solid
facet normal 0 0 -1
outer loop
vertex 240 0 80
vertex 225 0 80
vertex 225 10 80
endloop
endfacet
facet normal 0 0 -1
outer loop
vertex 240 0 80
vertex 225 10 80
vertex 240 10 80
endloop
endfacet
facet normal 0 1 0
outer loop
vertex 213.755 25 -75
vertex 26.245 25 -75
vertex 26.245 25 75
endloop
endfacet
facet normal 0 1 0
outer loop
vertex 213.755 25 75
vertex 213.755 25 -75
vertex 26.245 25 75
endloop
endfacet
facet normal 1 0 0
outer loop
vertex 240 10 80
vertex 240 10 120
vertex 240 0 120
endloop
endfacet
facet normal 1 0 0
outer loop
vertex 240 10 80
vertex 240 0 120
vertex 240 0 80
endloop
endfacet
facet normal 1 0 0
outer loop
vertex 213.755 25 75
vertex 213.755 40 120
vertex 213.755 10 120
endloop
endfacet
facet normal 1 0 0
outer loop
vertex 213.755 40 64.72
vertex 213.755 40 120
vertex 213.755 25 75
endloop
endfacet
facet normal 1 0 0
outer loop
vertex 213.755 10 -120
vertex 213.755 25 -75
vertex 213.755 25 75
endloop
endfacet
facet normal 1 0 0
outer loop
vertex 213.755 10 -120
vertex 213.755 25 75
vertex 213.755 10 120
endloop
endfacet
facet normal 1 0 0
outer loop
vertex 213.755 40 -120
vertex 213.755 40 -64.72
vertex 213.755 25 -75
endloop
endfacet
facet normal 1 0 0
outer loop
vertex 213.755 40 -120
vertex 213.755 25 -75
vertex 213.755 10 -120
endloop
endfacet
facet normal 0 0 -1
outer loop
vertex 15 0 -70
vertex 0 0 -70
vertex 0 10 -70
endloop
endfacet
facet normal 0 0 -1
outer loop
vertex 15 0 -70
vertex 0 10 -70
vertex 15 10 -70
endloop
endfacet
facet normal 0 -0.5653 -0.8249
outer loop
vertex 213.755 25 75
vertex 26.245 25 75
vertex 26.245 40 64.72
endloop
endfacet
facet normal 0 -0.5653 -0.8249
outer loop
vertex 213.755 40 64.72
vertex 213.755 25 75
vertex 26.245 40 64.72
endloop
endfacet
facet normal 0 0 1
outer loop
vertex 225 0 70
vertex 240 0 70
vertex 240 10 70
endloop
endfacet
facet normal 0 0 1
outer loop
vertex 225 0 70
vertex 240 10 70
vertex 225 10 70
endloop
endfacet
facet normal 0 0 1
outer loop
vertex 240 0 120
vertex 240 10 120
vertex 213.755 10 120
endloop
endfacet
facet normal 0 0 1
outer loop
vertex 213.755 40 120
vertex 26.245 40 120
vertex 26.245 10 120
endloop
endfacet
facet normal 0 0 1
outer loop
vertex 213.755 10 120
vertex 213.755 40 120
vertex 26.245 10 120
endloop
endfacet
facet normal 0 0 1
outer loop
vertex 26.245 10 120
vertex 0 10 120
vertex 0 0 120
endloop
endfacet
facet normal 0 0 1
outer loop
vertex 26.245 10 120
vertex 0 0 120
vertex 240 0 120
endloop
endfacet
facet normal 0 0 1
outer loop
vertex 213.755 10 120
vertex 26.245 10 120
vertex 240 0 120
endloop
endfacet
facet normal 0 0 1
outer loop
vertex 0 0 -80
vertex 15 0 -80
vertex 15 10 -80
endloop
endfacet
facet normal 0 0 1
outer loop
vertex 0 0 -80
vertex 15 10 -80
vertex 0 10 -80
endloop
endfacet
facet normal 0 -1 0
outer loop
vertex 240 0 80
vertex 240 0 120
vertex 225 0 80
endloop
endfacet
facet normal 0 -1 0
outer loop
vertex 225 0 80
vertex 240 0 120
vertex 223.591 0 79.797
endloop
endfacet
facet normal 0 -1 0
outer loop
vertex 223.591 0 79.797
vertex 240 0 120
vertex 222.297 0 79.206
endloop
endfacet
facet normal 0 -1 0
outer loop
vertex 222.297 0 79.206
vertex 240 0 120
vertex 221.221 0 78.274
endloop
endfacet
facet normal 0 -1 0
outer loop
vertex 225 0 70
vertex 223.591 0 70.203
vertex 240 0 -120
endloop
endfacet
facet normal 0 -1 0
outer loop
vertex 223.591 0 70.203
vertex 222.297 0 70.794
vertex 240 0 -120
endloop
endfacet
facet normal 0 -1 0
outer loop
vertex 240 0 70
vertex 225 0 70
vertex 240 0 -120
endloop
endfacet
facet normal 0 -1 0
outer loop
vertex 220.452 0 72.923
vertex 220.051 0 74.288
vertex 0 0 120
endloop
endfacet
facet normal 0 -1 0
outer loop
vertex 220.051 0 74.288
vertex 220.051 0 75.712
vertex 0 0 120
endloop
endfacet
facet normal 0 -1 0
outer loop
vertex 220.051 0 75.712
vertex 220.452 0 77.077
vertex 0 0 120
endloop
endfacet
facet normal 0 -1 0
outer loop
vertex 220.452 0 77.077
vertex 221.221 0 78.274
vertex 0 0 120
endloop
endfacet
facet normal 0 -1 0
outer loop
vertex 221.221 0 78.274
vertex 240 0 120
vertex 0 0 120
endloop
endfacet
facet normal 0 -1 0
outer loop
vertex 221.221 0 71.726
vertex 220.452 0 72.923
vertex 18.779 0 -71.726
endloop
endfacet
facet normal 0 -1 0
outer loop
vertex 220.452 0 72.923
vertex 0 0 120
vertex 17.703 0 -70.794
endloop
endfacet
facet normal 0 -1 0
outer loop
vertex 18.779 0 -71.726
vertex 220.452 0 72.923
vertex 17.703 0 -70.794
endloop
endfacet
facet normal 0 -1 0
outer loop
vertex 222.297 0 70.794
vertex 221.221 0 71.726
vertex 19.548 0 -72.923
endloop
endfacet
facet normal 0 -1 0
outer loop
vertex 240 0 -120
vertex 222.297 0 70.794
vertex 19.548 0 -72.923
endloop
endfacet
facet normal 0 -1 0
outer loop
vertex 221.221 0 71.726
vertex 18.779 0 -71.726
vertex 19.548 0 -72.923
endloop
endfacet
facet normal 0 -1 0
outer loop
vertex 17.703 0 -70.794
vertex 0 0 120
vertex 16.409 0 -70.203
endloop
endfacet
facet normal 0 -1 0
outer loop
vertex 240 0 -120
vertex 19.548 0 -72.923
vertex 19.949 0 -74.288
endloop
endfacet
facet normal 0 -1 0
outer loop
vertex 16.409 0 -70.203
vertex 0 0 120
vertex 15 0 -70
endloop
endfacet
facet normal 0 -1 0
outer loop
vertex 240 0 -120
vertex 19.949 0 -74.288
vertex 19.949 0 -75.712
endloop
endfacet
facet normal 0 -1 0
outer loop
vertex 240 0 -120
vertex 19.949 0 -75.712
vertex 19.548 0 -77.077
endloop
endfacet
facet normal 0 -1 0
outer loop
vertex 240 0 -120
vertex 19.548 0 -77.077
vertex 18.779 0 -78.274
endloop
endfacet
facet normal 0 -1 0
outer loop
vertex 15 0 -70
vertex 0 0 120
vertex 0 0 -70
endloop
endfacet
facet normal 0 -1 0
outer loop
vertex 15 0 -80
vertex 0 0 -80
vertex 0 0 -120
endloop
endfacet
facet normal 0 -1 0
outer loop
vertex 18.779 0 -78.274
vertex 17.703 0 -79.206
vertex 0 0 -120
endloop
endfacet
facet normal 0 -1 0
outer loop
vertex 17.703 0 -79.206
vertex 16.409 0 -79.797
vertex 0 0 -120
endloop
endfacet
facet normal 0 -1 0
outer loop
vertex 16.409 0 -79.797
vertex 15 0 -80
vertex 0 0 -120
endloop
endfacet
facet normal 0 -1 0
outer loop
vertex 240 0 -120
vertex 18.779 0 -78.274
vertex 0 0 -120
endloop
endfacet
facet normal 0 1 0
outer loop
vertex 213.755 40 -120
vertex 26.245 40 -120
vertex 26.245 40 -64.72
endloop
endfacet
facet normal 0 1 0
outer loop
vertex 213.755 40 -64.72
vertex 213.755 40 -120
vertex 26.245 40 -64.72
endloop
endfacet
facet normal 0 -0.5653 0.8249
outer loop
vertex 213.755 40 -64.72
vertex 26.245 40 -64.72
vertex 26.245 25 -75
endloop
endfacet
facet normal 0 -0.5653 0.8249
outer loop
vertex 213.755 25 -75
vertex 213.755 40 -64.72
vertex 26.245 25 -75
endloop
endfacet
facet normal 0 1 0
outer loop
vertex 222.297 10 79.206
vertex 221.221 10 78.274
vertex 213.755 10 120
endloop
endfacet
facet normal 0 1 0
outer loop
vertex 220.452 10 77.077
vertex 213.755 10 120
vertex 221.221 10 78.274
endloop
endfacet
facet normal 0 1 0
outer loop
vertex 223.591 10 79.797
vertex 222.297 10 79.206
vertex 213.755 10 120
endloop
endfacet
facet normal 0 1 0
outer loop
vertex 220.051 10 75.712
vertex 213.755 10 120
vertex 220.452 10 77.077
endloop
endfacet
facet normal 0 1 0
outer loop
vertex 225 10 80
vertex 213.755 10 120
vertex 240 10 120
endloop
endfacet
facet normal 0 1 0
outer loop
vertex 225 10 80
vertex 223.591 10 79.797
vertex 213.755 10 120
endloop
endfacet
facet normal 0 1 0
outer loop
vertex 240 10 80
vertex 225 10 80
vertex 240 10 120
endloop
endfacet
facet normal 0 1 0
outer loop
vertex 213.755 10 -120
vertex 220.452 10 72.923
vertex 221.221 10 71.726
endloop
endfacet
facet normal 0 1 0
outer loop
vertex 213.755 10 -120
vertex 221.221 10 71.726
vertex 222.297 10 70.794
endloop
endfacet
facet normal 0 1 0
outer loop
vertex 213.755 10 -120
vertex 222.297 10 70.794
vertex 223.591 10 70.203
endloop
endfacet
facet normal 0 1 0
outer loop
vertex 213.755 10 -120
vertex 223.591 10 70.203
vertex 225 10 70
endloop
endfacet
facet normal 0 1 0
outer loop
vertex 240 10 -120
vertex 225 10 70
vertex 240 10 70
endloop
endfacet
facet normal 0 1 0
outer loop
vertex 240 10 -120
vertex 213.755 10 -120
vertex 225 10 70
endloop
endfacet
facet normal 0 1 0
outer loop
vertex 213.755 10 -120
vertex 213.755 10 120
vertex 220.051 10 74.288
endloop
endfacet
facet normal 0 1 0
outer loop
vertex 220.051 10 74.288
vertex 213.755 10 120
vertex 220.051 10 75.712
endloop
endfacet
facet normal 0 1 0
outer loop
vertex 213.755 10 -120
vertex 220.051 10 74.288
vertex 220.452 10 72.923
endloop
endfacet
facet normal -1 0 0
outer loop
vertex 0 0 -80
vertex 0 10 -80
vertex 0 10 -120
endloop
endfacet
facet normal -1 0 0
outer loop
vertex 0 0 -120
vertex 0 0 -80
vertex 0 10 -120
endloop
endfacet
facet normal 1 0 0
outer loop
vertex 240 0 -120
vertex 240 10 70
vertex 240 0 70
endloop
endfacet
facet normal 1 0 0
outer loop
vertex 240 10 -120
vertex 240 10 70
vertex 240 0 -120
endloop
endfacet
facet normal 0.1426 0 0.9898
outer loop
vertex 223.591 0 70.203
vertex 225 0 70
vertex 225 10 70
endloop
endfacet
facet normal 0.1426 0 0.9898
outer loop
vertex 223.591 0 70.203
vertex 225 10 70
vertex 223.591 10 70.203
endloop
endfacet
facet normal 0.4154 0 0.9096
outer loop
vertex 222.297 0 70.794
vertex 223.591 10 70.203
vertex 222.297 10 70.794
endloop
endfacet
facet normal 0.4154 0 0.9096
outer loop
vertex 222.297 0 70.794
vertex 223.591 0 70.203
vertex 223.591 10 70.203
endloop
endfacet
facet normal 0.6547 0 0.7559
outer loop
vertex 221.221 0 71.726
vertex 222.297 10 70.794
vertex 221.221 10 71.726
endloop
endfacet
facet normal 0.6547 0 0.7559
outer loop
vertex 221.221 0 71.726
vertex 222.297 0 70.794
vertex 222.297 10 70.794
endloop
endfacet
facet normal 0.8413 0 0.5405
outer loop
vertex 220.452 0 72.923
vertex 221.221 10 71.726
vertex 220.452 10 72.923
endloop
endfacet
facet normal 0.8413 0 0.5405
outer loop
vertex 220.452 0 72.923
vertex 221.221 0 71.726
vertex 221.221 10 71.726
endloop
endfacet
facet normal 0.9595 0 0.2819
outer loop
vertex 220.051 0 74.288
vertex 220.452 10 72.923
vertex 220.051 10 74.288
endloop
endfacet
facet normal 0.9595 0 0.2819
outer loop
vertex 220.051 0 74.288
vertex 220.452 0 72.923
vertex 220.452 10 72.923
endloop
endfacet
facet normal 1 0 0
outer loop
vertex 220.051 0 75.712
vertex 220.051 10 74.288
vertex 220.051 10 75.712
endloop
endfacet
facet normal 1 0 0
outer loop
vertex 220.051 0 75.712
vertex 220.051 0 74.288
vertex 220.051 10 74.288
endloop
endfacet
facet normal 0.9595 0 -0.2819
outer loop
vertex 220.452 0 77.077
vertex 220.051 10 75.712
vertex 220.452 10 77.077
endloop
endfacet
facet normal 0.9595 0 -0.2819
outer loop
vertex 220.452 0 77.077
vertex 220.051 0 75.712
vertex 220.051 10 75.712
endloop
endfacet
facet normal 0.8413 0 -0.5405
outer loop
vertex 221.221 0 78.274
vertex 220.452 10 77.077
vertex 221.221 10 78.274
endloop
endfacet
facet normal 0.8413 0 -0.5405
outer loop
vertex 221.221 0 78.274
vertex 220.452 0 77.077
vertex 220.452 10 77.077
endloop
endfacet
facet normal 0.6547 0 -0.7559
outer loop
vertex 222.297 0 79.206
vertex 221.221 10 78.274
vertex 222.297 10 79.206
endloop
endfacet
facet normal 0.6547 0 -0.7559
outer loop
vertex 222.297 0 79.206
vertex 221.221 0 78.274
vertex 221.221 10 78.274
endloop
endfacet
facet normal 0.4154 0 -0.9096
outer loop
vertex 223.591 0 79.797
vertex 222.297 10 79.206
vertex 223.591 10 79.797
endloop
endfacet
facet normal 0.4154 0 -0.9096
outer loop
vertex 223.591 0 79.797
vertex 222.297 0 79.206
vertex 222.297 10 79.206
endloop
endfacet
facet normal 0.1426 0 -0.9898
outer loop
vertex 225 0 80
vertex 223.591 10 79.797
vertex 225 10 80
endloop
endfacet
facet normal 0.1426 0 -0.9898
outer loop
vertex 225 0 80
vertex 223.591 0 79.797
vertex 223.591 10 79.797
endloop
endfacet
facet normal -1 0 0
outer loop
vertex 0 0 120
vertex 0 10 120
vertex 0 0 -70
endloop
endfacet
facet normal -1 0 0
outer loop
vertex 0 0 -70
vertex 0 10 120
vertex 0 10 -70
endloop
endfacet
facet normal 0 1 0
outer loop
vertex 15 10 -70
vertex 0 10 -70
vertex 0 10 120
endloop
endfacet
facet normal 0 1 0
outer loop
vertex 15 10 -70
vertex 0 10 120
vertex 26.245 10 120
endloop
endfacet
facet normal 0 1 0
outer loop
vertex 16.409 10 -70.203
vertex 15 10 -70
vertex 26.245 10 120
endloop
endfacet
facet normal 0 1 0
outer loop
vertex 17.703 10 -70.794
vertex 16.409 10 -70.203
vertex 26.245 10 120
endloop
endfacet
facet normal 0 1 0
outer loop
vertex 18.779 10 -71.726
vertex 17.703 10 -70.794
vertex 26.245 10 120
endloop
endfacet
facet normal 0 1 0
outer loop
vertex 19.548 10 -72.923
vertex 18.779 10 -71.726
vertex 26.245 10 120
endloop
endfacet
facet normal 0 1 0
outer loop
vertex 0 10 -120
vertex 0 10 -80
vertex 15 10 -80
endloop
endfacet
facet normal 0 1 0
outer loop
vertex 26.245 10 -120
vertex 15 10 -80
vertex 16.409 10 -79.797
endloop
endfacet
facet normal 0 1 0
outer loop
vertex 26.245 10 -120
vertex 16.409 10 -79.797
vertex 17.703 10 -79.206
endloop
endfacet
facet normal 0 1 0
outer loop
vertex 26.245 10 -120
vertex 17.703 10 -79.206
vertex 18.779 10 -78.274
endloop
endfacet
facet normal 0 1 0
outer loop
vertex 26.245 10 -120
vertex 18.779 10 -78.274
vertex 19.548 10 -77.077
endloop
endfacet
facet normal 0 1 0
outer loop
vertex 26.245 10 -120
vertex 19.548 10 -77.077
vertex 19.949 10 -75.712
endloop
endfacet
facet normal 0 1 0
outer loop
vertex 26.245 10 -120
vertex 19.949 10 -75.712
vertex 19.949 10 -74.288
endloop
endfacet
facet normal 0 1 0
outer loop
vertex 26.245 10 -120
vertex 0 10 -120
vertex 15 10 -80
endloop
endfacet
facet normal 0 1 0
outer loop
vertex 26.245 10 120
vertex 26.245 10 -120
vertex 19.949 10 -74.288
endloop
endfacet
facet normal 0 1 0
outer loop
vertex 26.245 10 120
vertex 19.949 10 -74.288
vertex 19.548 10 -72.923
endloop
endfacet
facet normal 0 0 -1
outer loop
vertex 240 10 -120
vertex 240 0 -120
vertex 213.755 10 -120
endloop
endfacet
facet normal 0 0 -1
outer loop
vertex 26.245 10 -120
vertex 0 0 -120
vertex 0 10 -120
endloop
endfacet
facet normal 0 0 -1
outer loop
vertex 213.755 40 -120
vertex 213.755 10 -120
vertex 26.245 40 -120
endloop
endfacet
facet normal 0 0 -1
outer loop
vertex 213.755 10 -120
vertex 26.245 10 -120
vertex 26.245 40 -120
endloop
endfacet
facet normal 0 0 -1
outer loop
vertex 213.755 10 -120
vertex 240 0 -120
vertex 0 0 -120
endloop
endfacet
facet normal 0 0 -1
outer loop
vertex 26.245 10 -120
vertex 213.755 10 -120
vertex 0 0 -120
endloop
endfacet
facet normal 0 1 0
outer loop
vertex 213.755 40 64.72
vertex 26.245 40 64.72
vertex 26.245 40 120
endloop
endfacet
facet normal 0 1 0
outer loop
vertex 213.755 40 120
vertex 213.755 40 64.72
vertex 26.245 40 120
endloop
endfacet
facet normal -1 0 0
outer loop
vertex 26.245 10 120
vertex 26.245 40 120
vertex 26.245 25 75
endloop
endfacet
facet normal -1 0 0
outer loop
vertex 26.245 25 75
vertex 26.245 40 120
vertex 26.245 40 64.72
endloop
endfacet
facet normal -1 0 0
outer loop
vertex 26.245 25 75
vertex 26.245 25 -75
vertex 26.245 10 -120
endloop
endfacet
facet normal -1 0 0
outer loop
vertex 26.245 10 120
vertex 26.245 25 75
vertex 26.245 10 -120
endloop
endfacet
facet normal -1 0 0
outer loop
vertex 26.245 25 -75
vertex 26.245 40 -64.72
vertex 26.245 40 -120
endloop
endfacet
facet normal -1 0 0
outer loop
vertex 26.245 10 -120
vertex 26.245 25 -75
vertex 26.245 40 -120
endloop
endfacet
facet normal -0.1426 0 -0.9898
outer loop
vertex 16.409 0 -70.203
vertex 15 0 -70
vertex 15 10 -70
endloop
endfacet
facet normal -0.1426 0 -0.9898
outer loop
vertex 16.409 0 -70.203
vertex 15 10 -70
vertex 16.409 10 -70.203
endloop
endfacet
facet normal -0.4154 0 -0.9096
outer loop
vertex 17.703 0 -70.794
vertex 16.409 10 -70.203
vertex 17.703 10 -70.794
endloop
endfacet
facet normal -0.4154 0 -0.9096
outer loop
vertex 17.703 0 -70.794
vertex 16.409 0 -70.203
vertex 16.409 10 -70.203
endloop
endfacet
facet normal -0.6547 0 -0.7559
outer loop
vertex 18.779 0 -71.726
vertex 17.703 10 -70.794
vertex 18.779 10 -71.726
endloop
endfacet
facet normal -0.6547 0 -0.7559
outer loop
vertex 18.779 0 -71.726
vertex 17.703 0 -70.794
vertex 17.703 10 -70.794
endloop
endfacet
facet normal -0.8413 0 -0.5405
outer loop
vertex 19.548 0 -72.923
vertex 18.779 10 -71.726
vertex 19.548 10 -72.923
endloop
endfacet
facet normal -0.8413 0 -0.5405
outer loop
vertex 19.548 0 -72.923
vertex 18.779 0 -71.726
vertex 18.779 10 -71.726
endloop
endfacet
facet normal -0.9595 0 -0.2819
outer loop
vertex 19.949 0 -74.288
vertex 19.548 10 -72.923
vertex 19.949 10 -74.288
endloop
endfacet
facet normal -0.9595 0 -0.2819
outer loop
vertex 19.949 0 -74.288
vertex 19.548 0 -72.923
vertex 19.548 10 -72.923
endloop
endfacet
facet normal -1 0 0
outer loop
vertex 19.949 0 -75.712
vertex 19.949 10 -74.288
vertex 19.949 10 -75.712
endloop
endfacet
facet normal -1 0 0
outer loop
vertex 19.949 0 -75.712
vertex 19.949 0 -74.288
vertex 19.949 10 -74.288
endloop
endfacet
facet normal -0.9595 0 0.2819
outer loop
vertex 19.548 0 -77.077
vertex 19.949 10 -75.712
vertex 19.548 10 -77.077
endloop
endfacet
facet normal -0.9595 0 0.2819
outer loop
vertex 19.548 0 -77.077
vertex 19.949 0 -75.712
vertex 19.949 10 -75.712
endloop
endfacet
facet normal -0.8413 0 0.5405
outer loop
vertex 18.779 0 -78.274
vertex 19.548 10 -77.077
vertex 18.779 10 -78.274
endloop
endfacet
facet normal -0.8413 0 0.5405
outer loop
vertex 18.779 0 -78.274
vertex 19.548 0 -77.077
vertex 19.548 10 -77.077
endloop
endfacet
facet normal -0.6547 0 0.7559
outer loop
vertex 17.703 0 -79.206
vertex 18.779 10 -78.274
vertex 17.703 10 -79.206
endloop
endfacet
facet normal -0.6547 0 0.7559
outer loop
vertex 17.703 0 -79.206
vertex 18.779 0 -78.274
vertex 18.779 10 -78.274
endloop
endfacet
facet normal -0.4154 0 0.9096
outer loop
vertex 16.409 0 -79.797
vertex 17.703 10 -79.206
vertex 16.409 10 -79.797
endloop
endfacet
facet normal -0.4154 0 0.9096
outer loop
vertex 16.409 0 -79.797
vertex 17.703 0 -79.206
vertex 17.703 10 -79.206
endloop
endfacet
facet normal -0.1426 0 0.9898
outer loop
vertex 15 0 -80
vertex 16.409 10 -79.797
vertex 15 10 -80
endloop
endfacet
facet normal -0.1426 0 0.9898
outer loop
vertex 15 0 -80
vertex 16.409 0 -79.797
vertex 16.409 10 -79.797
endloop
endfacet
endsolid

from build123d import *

# Parameters (mm, degrees)
EXTRUDE_1_DEPTH     = 240
CUT_EXTRUDE_1_DEPTH = 41
SKETCH_3_W          = 26.245299516
SKETCH_3_H          = 240
CUT_EXTRUDE_2_DEPTH = 30


with BuildPart() as part:
    # Эскиз1 → Бобышка-Вытянуть1 (new body)
    with BuildSketch(Plane(origin=(0, 0, 0), x_dir=(0, 0, -1), z_dir=(1, 0, 0))):
        Polygon((-120, 0), (120, 0), (120, 40), (64.71995712, 40), (75, 25), (-75, 25), (-64.71995712, 40), (-120, 40), align=None)
    extrude(amount=EXTRUDE_1_DEPTH)

    # Эскиз2 → Вырез-Вытянуть1 (cut, through all)
    with BuildSketch(Plane.XZ):
        with BuildLine():
            Line((240, 80), (240, 70))
            Line((240, 70), (225, 70))
            ThreePointArc((225, 70), (220, 75), (225, 80))
            Line((225, 80), (240, 80))
        make_face()
        with BuildLine():
            Line((0, -80), (0, -70))
            Line((0, -70), (15, -70))
            ThreePointArc((15, -70), (20, -75), (15, -80))
            Line((15, -80), (0, -80))
        make_face()
    extrude(amount=-CUT_EXTRUDE_1_DEPTH, mode=Mode.SUBTRACT)

    # Эскиз3 → Вырез-Вытянуть2 (cut)
    with BuildSketch(Plane(origin=(0, 40, 0), x_dir=(1, 0, 0), z_dir=(0, 1, 0))):
        with Locations((13.122649758, 0)):
            Rectangle(SKETCH_3_W, SKETCH_3_H)
        with Locations((226.877350242, 0)):
            Rectangle(SKETCH_3_W, SKETCH_3_H)
    extrude(amount=-CUT_EXTRUDE_2_DEPTH, mode=Mode.SUBTRACT)


solid = part.part
